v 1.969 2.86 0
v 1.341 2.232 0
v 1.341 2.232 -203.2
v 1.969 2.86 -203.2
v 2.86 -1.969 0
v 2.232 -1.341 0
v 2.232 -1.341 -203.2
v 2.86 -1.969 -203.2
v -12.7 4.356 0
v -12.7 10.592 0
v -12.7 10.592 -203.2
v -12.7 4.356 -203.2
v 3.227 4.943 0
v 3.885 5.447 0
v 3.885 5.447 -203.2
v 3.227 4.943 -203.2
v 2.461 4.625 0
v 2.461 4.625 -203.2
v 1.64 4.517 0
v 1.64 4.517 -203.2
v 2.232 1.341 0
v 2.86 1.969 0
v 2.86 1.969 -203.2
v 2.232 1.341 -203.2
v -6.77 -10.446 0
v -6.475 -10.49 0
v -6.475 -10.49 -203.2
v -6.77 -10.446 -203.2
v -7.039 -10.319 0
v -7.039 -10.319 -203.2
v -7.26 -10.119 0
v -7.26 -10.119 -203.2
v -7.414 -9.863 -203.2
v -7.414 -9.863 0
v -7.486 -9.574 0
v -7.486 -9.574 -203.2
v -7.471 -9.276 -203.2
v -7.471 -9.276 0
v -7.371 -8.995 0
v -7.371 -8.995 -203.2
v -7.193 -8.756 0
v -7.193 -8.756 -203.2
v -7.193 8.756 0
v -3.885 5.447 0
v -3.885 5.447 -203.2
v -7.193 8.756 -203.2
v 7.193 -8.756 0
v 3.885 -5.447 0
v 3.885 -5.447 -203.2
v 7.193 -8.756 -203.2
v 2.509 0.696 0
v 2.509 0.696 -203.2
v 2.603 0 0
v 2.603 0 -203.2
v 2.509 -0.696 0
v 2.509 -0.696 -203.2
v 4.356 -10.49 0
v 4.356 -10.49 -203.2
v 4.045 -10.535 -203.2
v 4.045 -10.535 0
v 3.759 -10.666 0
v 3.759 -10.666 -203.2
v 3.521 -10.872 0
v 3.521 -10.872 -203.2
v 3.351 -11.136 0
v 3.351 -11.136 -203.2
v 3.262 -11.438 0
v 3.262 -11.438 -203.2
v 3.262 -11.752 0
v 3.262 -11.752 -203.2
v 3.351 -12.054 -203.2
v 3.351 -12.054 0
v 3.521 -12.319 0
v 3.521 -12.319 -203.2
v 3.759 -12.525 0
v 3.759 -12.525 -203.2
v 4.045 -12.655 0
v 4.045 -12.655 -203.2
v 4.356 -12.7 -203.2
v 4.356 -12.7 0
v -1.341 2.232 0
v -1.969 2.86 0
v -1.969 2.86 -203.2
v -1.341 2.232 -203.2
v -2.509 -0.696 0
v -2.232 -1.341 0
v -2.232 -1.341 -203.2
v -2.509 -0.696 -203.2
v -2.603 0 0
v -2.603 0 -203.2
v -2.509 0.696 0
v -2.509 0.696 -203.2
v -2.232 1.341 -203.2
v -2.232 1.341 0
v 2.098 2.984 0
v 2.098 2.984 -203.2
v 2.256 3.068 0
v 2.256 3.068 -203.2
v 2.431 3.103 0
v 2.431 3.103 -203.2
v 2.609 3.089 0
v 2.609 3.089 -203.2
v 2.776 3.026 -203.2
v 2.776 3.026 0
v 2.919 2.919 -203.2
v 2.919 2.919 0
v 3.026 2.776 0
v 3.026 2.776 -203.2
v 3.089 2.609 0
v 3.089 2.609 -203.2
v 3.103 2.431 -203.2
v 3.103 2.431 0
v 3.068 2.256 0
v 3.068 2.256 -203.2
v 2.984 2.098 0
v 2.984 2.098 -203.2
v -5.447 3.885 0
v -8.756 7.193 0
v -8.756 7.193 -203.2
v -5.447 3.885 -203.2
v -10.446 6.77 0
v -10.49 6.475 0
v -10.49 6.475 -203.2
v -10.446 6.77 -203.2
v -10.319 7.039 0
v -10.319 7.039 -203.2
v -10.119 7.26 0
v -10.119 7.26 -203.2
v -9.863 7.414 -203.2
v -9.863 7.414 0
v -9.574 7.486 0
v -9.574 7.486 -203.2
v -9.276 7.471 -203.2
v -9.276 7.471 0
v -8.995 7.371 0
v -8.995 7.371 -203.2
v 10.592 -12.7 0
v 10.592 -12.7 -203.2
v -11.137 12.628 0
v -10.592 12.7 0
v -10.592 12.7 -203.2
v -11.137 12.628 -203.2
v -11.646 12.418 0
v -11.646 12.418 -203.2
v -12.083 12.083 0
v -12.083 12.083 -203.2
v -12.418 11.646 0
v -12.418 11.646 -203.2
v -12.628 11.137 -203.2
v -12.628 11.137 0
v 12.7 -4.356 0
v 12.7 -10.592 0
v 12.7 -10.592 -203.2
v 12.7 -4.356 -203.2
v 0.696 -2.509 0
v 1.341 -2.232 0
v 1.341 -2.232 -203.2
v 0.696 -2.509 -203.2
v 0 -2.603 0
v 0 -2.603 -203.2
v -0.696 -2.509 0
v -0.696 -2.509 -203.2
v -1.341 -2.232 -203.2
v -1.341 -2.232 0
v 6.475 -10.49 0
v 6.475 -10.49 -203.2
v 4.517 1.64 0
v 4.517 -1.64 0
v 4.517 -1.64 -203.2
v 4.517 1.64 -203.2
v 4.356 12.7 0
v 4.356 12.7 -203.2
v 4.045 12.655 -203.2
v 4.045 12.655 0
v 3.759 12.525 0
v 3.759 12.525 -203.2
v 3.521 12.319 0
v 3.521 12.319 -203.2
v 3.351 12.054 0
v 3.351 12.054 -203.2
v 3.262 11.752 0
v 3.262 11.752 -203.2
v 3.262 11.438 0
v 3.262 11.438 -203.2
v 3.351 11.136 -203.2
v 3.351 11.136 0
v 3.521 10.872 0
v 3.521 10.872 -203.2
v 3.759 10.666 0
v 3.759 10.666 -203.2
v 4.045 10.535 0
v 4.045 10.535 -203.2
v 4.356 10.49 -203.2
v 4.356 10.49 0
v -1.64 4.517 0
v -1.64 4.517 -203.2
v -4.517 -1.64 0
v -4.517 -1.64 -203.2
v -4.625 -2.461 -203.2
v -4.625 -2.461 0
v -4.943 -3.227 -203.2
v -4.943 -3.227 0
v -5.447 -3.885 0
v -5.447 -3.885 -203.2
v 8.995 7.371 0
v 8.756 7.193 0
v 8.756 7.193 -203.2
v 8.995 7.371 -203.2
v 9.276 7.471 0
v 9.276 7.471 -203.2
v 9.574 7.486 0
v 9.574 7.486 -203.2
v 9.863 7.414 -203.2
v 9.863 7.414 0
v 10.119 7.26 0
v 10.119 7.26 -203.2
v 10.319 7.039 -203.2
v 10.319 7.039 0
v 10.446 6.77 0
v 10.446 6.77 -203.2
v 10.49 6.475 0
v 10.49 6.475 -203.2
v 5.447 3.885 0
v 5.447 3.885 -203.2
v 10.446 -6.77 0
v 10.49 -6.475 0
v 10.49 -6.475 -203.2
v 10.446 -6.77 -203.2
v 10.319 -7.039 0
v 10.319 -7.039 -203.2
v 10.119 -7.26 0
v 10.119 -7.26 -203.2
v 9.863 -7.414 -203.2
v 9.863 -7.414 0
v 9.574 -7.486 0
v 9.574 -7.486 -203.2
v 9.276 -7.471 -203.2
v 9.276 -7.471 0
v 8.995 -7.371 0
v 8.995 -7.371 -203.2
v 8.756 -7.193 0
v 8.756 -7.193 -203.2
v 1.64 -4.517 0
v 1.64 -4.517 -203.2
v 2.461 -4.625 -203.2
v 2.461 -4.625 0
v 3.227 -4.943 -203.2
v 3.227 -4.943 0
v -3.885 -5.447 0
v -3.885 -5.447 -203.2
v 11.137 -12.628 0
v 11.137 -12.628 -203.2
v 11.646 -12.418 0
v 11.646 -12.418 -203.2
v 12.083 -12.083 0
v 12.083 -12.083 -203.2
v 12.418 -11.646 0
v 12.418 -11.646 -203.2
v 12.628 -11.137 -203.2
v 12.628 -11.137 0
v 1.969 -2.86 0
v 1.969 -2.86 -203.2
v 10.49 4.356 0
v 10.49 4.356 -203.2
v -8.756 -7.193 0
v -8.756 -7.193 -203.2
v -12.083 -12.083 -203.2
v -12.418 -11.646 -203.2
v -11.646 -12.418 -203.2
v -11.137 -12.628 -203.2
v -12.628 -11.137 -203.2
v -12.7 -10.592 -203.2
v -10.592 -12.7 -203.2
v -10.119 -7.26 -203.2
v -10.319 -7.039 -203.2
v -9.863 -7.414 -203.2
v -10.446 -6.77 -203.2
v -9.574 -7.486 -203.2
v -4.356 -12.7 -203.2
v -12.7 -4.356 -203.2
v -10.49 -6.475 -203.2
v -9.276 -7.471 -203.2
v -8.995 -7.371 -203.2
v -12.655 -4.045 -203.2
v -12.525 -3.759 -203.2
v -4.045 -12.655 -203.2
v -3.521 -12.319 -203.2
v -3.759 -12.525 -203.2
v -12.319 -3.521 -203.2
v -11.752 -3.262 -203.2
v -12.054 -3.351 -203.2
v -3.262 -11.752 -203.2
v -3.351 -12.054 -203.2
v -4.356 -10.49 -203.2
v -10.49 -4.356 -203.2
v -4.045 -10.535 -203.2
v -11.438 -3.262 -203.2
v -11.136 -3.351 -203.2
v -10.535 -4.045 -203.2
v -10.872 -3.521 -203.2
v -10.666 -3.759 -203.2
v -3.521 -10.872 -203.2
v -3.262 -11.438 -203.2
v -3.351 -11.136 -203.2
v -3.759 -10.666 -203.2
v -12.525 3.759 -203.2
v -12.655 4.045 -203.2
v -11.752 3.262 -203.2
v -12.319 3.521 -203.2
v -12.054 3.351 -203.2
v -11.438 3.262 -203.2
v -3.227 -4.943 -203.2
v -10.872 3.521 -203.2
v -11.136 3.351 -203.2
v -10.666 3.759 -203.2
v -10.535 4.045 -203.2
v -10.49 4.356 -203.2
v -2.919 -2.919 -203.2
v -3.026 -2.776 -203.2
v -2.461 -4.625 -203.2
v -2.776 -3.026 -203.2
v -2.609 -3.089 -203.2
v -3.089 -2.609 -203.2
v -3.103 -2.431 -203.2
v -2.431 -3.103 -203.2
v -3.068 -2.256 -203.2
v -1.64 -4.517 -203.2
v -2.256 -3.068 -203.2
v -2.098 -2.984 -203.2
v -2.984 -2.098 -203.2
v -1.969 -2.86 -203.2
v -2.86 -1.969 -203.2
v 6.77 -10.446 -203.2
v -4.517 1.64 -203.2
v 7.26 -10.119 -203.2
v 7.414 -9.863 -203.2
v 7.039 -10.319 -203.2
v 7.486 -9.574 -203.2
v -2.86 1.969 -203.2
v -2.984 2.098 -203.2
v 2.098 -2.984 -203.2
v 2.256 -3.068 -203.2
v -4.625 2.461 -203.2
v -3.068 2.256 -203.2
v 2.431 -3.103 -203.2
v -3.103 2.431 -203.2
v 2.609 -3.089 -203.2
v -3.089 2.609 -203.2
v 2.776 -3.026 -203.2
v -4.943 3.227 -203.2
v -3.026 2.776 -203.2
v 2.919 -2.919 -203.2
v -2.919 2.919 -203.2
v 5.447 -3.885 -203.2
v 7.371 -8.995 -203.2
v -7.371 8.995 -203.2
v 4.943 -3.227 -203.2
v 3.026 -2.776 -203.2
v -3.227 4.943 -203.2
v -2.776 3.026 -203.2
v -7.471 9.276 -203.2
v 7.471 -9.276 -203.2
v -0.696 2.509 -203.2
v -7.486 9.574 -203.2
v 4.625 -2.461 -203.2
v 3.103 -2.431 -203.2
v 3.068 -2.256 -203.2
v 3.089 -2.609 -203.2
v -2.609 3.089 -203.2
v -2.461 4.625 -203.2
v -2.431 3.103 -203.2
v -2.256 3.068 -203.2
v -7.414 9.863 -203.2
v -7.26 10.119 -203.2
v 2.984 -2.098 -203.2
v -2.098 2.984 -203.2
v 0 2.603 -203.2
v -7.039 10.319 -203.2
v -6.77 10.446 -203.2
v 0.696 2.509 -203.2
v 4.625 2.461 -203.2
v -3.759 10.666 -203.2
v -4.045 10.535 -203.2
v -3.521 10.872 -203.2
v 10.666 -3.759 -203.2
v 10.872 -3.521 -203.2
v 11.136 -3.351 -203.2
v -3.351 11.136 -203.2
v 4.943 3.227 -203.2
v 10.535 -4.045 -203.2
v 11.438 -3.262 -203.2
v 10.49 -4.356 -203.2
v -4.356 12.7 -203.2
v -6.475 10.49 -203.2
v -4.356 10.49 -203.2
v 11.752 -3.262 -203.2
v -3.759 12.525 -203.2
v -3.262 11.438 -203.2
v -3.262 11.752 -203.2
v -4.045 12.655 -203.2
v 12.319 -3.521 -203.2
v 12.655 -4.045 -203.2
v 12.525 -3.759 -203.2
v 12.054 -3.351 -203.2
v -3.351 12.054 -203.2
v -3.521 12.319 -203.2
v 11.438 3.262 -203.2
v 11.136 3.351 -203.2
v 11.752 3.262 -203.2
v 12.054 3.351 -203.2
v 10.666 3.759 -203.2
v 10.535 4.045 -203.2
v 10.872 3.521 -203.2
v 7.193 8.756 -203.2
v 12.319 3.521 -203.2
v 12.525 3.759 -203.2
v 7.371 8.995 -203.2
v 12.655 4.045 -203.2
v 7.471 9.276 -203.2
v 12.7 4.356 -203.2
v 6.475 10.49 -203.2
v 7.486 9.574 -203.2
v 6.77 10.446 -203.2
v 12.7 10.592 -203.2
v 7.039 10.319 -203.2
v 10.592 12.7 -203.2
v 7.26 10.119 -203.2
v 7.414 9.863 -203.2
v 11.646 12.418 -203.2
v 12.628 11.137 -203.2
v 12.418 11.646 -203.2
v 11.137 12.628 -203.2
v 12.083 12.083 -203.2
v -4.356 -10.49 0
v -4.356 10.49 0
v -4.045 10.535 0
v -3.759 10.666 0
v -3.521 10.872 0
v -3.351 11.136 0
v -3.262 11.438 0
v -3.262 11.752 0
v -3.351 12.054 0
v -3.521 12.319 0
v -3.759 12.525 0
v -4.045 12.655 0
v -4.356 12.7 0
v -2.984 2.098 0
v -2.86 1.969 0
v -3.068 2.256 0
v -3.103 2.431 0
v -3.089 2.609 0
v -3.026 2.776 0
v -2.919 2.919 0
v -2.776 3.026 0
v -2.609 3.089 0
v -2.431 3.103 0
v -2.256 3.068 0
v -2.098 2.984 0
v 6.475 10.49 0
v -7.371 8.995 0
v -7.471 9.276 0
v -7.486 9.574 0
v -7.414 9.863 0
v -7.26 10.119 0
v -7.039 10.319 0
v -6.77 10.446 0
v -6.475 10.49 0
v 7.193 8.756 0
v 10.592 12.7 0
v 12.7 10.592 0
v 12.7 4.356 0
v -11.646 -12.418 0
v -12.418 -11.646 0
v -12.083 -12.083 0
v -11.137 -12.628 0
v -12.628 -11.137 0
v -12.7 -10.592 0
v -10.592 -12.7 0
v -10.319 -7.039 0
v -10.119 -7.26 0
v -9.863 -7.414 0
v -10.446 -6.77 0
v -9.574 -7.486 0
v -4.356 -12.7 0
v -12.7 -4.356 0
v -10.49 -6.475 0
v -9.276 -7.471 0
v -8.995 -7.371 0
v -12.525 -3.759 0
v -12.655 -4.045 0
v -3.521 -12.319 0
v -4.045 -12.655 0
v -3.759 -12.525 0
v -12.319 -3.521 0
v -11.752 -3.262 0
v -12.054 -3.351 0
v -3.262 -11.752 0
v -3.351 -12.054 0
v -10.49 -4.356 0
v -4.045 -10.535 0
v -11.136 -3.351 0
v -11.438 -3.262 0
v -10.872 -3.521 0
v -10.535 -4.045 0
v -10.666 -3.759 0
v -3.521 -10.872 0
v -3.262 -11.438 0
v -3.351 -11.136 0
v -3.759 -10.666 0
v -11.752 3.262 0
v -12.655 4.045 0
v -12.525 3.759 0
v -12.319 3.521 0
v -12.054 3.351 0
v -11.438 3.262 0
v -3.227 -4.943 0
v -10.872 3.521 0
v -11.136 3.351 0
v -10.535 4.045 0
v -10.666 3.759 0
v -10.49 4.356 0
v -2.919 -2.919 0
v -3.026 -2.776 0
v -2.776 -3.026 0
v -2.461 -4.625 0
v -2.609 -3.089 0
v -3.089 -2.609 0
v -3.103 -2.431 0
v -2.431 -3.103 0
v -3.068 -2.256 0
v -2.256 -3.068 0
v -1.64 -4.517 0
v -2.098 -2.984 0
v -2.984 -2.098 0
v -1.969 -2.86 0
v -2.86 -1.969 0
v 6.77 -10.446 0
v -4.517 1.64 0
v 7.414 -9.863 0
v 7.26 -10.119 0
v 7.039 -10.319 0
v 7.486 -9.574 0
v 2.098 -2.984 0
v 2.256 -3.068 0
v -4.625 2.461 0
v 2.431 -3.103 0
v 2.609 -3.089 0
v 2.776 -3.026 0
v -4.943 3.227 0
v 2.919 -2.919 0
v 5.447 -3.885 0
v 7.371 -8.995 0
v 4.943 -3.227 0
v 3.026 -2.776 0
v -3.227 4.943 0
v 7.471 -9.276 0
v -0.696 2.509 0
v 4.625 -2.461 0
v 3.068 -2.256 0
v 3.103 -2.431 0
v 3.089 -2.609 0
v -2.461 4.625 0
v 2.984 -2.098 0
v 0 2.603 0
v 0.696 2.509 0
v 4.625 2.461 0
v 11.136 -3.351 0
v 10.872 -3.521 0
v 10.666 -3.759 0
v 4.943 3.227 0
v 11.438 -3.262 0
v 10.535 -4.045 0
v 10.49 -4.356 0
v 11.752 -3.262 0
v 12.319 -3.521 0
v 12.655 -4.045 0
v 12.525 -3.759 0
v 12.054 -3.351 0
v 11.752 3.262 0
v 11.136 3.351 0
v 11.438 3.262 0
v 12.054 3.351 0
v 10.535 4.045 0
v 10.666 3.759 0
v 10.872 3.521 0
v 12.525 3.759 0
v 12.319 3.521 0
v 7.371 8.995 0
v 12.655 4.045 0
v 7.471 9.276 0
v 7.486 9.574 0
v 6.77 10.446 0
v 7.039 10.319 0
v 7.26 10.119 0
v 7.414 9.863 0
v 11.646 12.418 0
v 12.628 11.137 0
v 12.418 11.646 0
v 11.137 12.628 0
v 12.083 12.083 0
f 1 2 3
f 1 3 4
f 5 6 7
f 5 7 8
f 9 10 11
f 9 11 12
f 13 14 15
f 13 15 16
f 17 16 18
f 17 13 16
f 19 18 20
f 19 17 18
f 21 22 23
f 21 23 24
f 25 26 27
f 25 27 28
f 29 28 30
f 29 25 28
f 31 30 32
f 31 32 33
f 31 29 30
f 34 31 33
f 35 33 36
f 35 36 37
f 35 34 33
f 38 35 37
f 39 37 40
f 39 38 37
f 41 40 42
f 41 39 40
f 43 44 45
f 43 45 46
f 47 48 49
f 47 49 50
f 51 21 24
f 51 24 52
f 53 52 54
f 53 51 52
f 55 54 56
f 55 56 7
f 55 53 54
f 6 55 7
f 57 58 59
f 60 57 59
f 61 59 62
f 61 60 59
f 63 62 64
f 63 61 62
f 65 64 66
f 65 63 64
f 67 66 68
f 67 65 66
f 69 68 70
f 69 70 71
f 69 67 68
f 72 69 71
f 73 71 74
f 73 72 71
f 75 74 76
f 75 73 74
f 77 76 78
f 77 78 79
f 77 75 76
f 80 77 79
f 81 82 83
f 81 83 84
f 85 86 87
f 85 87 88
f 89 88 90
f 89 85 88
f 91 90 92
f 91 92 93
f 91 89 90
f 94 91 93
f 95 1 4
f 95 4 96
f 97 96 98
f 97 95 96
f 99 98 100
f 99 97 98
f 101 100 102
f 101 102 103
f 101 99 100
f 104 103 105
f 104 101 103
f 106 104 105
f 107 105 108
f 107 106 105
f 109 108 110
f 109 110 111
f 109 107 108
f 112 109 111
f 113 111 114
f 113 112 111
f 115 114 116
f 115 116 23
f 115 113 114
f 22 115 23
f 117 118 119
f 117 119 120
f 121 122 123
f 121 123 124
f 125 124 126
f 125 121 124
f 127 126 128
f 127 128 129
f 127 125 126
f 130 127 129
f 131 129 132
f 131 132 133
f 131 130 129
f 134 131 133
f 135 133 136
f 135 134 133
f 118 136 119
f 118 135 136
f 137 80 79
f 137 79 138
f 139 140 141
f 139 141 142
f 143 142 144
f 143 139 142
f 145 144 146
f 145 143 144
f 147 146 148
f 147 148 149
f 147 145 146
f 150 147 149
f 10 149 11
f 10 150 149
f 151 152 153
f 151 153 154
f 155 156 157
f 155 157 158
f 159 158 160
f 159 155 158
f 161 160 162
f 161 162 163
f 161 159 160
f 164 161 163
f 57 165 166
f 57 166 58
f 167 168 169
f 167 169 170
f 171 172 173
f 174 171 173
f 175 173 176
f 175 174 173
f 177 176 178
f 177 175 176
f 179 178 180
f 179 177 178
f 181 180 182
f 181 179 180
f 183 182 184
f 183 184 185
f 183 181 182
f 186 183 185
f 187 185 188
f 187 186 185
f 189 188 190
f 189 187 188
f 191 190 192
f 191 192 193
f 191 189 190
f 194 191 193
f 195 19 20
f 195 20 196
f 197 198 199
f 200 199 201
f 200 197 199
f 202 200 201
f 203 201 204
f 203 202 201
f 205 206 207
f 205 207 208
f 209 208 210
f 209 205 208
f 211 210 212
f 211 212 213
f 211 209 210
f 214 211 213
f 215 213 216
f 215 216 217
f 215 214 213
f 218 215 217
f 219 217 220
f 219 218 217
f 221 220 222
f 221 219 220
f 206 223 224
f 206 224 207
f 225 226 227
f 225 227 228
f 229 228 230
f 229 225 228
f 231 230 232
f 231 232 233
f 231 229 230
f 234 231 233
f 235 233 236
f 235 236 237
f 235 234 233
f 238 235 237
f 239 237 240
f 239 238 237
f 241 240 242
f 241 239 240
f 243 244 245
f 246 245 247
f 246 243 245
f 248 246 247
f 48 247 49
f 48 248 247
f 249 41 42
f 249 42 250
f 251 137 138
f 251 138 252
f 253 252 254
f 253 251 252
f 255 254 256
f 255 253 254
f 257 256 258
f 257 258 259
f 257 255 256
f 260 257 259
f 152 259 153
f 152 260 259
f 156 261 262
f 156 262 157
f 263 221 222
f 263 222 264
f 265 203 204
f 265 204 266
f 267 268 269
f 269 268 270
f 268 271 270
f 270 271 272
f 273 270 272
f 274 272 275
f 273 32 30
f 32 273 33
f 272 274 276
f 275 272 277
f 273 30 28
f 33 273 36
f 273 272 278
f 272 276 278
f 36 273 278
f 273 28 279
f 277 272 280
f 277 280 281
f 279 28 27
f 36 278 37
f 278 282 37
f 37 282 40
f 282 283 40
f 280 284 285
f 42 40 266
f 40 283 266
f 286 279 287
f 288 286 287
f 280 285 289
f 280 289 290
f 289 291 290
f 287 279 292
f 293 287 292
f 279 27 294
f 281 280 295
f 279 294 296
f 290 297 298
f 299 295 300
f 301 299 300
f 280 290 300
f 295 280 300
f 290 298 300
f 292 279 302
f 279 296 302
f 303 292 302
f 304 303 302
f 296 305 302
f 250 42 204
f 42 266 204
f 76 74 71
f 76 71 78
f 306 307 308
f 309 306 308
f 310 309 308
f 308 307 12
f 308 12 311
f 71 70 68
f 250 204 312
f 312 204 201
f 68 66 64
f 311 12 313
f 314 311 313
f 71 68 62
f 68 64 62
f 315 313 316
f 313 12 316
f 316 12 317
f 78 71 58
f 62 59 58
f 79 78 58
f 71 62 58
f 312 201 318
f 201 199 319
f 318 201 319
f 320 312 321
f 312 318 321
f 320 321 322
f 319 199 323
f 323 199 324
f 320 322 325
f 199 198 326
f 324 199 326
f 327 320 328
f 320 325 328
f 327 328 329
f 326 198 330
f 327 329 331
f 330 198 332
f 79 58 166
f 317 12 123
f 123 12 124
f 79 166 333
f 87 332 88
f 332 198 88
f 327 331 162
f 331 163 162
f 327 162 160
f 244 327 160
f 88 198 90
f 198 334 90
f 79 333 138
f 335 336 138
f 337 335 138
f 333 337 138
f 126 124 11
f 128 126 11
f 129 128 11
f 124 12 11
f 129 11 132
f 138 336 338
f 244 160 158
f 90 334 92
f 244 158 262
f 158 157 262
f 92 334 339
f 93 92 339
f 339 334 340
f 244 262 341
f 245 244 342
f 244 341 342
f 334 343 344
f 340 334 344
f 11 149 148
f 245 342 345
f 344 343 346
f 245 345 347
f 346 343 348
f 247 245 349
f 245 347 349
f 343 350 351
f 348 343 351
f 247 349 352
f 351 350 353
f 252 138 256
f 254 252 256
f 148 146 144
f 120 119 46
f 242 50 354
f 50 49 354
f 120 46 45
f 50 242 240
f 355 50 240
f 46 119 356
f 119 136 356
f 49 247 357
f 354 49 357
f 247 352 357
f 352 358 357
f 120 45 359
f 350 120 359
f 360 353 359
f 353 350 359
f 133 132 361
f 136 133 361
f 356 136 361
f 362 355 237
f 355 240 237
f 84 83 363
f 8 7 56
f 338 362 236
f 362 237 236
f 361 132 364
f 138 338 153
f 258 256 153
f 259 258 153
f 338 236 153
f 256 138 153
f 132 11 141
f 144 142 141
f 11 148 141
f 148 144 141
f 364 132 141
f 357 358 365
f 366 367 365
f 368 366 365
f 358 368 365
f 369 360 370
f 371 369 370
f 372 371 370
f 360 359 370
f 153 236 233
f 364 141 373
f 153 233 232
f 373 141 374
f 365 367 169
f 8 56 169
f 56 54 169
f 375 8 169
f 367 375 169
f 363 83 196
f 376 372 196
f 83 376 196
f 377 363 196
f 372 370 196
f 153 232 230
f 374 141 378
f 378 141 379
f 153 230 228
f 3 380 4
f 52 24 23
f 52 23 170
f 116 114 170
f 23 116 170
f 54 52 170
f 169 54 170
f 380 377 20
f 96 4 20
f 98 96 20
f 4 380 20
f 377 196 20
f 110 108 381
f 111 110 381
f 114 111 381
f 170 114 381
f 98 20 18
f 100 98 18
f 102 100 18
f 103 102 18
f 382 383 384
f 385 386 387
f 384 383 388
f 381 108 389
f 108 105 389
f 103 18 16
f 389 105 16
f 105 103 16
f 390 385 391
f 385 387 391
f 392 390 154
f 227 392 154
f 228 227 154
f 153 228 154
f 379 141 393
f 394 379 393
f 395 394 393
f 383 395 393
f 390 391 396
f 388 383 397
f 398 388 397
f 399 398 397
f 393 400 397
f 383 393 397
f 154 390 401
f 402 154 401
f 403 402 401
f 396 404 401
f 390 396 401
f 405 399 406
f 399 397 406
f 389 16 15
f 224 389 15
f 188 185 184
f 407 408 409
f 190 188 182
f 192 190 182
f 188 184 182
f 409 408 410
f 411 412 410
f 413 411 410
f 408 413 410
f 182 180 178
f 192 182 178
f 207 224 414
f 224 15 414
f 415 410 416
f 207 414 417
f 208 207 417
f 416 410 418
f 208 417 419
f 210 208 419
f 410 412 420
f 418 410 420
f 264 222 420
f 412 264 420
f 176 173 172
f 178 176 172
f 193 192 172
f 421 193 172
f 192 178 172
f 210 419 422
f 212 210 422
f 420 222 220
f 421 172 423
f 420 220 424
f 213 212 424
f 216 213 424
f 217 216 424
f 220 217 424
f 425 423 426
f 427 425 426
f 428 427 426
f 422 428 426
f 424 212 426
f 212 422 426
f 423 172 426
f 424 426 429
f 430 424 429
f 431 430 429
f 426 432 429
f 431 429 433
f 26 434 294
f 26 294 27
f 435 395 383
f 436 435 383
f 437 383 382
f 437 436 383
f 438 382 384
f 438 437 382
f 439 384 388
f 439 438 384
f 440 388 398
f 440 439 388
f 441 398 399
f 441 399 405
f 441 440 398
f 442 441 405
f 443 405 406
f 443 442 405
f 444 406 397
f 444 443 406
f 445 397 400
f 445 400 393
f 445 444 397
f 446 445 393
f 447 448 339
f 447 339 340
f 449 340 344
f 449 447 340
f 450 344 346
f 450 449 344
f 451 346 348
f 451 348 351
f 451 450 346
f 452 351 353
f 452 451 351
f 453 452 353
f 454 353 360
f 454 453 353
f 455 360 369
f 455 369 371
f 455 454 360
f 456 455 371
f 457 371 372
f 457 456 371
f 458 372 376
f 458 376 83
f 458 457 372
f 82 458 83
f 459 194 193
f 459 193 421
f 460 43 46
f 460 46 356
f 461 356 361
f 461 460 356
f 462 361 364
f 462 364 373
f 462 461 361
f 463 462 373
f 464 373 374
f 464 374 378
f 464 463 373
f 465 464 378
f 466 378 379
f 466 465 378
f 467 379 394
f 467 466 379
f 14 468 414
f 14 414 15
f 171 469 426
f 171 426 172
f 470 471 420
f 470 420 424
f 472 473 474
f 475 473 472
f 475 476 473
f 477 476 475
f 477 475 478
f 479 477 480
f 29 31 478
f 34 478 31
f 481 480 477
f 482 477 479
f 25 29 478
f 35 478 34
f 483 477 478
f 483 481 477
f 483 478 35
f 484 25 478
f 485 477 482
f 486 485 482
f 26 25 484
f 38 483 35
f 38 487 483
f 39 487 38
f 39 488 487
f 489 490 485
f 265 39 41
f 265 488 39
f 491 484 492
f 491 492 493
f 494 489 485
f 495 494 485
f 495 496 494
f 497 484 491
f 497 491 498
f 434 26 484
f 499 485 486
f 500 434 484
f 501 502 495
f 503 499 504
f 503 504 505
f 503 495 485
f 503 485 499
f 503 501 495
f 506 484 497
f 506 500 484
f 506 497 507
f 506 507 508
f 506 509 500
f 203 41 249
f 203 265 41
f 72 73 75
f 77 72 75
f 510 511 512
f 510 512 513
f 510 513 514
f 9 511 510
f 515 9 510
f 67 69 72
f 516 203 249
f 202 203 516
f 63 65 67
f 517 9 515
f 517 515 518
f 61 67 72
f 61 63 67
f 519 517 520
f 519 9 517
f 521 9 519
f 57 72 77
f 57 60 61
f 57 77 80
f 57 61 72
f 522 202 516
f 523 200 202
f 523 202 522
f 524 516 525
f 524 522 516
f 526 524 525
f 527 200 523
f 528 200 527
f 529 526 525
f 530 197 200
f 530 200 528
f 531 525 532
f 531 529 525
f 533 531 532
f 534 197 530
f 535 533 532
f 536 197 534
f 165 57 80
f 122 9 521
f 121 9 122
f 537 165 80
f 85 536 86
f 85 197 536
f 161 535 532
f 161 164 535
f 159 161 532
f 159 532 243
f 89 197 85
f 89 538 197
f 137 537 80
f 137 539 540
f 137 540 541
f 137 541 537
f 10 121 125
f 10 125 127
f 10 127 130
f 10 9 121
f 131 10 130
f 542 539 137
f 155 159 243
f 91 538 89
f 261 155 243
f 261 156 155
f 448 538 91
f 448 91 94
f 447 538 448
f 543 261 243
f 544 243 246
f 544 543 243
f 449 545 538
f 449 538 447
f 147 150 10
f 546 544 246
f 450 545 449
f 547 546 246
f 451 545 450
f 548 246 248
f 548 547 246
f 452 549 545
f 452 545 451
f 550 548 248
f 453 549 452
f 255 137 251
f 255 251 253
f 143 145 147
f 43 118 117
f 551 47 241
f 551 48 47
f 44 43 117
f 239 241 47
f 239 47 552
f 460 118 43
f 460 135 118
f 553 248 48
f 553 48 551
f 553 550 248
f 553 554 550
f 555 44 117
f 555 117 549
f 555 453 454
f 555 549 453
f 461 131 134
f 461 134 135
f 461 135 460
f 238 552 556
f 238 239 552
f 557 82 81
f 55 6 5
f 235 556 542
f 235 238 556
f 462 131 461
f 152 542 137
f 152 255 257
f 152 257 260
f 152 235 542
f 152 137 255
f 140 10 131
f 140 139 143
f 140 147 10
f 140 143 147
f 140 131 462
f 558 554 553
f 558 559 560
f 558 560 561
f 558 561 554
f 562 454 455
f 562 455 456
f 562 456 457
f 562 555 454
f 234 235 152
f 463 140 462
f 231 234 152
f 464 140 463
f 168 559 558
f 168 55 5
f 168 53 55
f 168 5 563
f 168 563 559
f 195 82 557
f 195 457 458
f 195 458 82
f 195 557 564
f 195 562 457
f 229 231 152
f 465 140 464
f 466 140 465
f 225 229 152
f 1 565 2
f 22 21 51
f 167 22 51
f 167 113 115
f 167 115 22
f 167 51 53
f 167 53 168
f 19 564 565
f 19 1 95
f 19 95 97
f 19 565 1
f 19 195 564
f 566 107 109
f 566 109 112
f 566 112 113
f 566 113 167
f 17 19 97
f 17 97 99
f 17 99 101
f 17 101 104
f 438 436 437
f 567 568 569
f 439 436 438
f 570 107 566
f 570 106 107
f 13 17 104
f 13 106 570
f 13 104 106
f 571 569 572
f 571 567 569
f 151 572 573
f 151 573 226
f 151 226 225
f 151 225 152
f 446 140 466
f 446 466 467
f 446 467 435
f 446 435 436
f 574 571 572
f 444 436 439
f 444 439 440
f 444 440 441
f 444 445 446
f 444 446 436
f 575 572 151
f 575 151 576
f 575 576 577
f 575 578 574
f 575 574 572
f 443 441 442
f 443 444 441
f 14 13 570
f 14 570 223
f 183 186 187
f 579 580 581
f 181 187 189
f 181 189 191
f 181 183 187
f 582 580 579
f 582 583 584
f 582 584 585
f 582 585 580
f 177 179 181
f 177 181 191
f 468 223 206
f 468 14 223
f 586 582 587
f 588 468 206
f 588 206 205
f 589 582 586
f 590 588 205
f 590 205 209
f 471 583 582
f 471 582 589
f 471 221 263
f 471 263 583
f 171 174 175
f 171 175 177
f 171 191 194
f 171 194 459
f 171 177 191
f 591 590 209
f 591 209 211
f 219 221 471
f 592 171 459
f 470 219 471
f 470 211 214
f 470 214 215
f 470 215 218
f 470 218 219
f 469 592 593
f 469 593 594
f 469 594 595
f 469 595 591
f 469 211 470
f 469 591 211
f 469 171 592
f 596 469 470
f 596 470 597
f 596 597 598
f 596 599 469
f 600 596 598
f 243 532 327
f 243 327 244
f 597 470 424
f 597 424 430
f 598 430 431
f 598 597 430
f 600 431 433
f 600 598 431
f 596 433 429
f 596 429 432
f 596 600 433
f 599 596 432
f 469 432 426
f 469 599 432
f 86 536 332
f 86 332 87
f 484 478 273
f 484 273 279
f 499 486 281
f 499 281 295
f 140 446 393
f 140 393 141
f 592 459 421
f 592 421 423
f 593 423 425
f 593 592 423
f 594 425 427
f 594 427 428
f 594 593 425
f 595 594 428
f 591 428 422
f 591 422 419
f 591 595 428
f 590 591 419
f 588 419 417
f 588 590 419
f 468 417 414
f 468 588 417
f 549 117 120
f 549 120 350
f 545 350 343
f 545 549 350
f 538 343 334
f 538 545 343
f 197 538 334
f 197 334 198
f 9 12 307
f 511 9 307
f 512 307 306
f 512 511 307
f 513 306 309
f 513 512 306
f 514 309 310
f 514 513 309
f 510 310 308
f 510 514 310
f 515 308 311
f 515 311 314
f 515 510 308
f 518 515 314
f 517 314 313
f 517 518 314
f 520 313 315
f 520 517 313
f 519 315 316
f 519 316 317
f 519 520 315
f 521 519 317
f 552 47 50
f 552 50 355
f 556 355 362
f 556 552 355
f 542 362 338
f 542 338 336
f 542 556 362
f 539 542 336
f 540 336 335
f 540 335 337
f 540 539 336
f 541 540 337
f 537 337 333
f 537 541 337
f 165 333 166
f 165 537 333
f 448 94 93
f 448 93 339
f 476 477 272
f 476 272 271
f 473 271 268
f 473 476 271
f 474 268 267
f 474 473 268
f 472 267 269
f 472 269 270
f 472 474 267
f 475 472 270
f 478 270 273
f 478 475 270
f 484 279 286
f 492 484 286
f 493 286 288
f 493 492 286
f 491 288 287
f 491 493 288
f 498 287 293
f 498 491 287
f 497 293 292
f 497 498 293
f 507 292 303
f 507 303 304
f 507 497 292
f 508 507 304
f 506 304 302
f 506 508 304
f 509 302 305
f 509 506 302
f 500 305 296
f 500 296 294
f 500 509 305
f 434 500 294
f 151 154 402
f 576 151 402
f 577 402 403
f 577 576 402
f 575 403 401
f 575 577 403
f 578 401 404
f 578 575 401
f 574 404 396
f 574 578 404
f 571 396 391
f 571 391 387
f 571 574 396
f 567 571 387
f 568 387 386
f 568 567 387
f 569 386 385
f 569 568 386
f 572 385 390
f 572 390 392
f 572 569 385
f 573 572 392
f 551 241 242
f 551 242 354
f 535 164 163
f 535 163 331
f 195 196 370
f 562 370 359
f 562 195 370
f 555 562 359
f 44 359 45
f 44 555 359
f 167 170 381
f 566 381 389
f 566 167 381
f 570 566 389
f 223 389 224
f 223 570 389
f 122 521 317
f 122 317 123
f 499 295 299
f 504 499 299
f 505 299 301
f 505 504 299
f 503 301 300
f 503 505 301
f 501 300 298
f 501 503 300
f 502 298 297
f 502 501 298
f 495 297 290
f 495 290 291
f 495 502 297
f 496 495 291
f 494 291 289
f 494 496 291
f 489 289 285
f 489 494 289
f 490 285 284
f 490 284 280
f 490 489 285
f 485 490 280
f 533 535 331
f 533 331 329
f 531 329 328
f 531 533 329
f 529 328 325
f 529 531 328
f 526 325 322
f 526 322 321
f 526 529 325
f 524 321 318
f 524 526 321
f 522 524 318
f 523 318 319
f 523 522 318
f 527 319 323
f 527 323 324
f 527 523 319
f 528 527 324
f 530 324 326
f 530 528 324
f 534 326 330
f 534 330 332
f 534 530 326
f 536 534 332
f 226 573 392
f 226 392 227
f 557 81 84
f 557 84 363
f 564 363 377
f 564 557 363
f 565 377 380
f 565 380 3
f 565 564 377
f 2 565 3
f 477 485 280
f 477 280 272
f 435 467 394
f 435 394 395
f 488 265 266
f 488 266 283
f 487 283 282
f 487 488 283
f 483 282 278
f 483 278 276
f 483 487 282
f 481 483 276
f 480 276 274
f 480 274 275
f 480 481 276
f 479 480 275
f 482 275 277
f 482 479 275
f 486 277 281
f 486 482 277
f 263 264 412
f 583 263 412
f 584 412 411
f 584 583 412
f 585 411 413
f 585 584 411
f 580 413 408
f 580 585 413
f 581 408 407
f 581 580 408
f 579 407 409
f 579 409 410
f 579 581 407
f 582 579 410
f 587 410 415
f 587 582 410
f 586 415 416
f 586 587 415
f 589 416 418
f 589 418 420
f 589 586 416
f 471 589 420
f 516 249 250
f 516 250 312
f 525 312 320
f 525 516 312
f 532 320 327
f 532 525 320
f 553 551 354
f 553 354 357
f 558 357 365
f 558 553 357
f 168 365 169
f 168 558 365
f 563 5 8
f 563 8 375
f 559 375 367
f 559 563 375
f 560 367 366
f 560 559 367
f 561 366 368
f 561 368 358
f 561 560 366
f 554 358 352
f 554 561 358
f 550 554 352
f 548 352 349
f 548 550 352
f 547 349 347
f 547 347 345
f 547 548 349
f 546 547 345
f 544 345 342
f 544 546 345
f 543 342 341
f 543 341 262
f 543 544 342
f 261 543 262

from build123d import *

# Parameters (mm, degrees)
EXTRUDE1_DEPTH = 203.2


with BuildPart() as part:
    # Sketch1 → Extrude1 (new body)
    with BuildSketch(Plane.XY):
        with BuildLine():
            Line((-3.88464389, 5.447103113), (-7.193320288, 8.75577951))
            ThreePointArc((-7.193320288, 8.75577951), (-7.413561403, 9.863006367), (-6.474899798, 10.4902))
            Line((-6.474899798, 10.4902), (-4.3561, 10.4902))
            ThreePointArc((-4.3561, 10.4902), (-3.2512, 11.5951), (-4.3561, 12.7))
            Line((-4.3561, 12.7), (-10.5918, 12.7))
            ThreePointArc((-10.5918, 12.7), (-12.082522516, 12.082522516), (-12.7, 10.5918))
            Line((-12.7, 10.5918), (-12.7, 4.3561))
            ThreePointArc((-12.7, 4.3561), (-11.5951, 3.2512), (-10.4902, 4.3561))
            Line((-10.4902, 4.3561), (-10.4902, 6.474899798))
            ThreePointArc((-10.4902, 6.474899798), (-9.863006367, 7.413561403), (-8.75577951, 7.193320288))
            Line((-8.75577951, 7.193320288), (-5.447103113, 3.88464389))
            ThreePointArc((-5.447103113, 3.88464389), (-4.758849627, 2.854599758), (-4.517167143, 1.63957986))
            Line((-4.517167143, 1.63957986), (-4.517167143, -1.63957986))
            ThreePointArc((-4.517167143, -1.63957986), (-4.758849627, -2.854599758), (-5.447103113, -3.88464389))
            Line((-5.447103113, -3.88464389), (-8.75577951, -7.193320288))
            ThreePointArc((-8.75577951, -7.193320288), (-9.863006367, -7.413561403), (-10.4902, -6.474899798))
            Line((-10.4902, -6.474899798), (-10.4902, -4.3561))
            ThreePointArc((-10.4902, -4.3561), (-11.5951, -3.2512), (-12.7, -4.3561))
            Line((-12.7, -4.3561), (-12.7, -10.5918))
            ThreePointArc((-12.7, -10.5918), (-12.082522516, -12.082522516), (-10.5918, -12.7))
            Line((-10.5918, -12.7), (-4.3561, -12.7))
            ThreePointArc((-4.3561, -12.7), (-3.2512, -11.5951), (-4.3561, -10.4902))
            Line((-4.3561, -10.4902), (-6.474899798, -10.4902))
            ThreePointArc((-6.474899798, -10.4902), (-7.413561403, -9.863006367), (-7.193320288, -8.75577951))
            Line((-7.193320288, -8.75577951), (-3.88464389, -5.447103113))
            ThreePointArc((-3.88464389, -5.447103113), (-2.854599758, -4.758849627), (-1.63957986, -4.517167143))
            Line((-1.63957986, -4.517167143), (1.63957986, -4.517167143))
            ThreePointArc((1.63957986, -4.517167143), (2.854599758, -4.758849627), (3.88464389, -5.447103113))
            Line((3.88464389, -5.447103113), (7.193320288, -8.75577951))
            ThreePointArc((7.193320288, -8.75577951), (7.413561403, -9.863006367), (6.474899798, -10.4902))
            Line((6.474899798, -10.4902), (4.3561, -10.4902))
            ThreePointArc((4.3561, -10.4902), (3.2512, -11.5951), (4.3561, -12.7))
            Line((4.3561, -12.7), (10.5918, -12.7))
            ThreePointArc((10.5918, -12.7), (12.082522516, -12.082522516), (12.7, -10.5918))
            Line((12.7, -10.5918), (12.7, -4.3561))
            ThreePointArc((12.7, -4.3561), (11.5951, -3.2512), (10.4902, -4.3561))
            Line((10.4902, -4.3561), (10.4902, -6.474899798))
            ThreePointArc((10.4902, -6.474899798), (9.863006367, -7.413561403), (8.75577951, -7.193320288))
            Line((8.75577951, -7.193320288), (5.447103113, -3.88464389))
            ThreePointArc((5.447103113, -3.88464389), (4.758849627, -2.854599758), (4.517167143, -1.63957986))
            Line((4.517167143, -1.63957986), (4.517167143, 1.63957986))
            ThreePointArc((4.517167143, 1.63957986), (4.758849627, 2.854599758), (5.447103113, 3.88464389))
            Line((5.447103113, 3.88464389), (8.75577951, 7.193320288))
            ThreePointArc((8.75577951, 7.193320288), (9.863006367, 7.413561403), (10.4902, 6.474899798))
            Line((10.4902, 6.474899798), (10.4902, 4.3561))
            ThreePointArc((10.4902, 4.3561), (11.5951, 3.2512), (12.7, 4.3561))
            Line((12.7, 4.3561), (12.7, 10.5918))
            ThreePointArc((12.7, 10.5918), (12.082522516, 12.082522516), (10.5918, 12.7))
            Line((10.5918, 12.7), (4.3561, 12.7))
            ThreePointArc((4.3561, 12.7), (3.2512, 11.5951), (4.3561, 10.4902))
            Line((4.3561, 10.4902), (6.474899798, 10.4902))
            ThreePointArc((6.474899798, 10.4902), (7.413561403, 9.863006367), (7.193320288, 8.75577951))
            Line((7.193320288, 8.75577951), (3.88464389, 5.447103113))
            ThreePointArc((3.88464389, 5.447103113), (2.854599758, 4.758849627), (1.63957986, 4.517167143))
            Line((1.63957986, 4.517167143), (-1.63957986, 4.517167143))
            ThreePointArc((-1.63957986, 4.517167143), (-2.854599758, 4.758849627), (-3.88464389, 5.447103113))
        make_face()
        with BuildLine():
            Line((-2.860474191, -1.969151357), (-2.231856263, -1.340533428))
            ThreePointArc((-2.231856263, -1.340533428), (-2.6035, 0), (-2.231856263, 1.340533428))
            Line((-2.231856263, 1.340533428), (-2.860474191, 1.969151357))
            ThreePointArc((-2.860474191, 1.969151357), (-2.918583239, 2.918583239), (-1.969151357, 2.860474191))
            Line((-1.969151357, 2.860474191), (-1.340533428, 2.231856263))
            ThreePointArc((-1.340533428, 2.231856263), (0, 2.6035), (1.340533428, 2.231856263))
            Line((1.340533428, 2.231856263), (1.969151357, 2.860474191))
            ThreePointArc((1.969151357, 2.860474191), (2.918583239, 2.918583239), (2.860474191, 1.969151357))
            Line((2.860474191, 1.969151357), (2.231856263, 1.340533428))
            ThreePointArc((2.231856263, 1.340533428), (2.6035, 0), (2.231856263, -1.340533428))
            Line((2.231856263, -1.340533428), (2.860474191, -1.969151357))
            ThreePointArc((2.860474191, -1.969151357), (2.918583239, -2.918583239), (1.969151357, -2.860474191))
            Line((1.969151357, -2.860474191), (1.340533428, -2.231856263))
            ThreePointArc((1.340533428, -2.231856263), (0, -2.6035), (-1.340533428, -2.231856263))
            Line((-1.340533428, -2.231856263), (-1.969151357, -2.860474191))
            ThreePointArc((-1.969151357, -2.860474191), (-2.918583239, -2.918583239), (-2.860474191, -1.969151357))
        make_face(mode=Mode.SUBTRACT)
    extrude(amount=-EXTRUDE1_DEPTH)


solid = part.part
